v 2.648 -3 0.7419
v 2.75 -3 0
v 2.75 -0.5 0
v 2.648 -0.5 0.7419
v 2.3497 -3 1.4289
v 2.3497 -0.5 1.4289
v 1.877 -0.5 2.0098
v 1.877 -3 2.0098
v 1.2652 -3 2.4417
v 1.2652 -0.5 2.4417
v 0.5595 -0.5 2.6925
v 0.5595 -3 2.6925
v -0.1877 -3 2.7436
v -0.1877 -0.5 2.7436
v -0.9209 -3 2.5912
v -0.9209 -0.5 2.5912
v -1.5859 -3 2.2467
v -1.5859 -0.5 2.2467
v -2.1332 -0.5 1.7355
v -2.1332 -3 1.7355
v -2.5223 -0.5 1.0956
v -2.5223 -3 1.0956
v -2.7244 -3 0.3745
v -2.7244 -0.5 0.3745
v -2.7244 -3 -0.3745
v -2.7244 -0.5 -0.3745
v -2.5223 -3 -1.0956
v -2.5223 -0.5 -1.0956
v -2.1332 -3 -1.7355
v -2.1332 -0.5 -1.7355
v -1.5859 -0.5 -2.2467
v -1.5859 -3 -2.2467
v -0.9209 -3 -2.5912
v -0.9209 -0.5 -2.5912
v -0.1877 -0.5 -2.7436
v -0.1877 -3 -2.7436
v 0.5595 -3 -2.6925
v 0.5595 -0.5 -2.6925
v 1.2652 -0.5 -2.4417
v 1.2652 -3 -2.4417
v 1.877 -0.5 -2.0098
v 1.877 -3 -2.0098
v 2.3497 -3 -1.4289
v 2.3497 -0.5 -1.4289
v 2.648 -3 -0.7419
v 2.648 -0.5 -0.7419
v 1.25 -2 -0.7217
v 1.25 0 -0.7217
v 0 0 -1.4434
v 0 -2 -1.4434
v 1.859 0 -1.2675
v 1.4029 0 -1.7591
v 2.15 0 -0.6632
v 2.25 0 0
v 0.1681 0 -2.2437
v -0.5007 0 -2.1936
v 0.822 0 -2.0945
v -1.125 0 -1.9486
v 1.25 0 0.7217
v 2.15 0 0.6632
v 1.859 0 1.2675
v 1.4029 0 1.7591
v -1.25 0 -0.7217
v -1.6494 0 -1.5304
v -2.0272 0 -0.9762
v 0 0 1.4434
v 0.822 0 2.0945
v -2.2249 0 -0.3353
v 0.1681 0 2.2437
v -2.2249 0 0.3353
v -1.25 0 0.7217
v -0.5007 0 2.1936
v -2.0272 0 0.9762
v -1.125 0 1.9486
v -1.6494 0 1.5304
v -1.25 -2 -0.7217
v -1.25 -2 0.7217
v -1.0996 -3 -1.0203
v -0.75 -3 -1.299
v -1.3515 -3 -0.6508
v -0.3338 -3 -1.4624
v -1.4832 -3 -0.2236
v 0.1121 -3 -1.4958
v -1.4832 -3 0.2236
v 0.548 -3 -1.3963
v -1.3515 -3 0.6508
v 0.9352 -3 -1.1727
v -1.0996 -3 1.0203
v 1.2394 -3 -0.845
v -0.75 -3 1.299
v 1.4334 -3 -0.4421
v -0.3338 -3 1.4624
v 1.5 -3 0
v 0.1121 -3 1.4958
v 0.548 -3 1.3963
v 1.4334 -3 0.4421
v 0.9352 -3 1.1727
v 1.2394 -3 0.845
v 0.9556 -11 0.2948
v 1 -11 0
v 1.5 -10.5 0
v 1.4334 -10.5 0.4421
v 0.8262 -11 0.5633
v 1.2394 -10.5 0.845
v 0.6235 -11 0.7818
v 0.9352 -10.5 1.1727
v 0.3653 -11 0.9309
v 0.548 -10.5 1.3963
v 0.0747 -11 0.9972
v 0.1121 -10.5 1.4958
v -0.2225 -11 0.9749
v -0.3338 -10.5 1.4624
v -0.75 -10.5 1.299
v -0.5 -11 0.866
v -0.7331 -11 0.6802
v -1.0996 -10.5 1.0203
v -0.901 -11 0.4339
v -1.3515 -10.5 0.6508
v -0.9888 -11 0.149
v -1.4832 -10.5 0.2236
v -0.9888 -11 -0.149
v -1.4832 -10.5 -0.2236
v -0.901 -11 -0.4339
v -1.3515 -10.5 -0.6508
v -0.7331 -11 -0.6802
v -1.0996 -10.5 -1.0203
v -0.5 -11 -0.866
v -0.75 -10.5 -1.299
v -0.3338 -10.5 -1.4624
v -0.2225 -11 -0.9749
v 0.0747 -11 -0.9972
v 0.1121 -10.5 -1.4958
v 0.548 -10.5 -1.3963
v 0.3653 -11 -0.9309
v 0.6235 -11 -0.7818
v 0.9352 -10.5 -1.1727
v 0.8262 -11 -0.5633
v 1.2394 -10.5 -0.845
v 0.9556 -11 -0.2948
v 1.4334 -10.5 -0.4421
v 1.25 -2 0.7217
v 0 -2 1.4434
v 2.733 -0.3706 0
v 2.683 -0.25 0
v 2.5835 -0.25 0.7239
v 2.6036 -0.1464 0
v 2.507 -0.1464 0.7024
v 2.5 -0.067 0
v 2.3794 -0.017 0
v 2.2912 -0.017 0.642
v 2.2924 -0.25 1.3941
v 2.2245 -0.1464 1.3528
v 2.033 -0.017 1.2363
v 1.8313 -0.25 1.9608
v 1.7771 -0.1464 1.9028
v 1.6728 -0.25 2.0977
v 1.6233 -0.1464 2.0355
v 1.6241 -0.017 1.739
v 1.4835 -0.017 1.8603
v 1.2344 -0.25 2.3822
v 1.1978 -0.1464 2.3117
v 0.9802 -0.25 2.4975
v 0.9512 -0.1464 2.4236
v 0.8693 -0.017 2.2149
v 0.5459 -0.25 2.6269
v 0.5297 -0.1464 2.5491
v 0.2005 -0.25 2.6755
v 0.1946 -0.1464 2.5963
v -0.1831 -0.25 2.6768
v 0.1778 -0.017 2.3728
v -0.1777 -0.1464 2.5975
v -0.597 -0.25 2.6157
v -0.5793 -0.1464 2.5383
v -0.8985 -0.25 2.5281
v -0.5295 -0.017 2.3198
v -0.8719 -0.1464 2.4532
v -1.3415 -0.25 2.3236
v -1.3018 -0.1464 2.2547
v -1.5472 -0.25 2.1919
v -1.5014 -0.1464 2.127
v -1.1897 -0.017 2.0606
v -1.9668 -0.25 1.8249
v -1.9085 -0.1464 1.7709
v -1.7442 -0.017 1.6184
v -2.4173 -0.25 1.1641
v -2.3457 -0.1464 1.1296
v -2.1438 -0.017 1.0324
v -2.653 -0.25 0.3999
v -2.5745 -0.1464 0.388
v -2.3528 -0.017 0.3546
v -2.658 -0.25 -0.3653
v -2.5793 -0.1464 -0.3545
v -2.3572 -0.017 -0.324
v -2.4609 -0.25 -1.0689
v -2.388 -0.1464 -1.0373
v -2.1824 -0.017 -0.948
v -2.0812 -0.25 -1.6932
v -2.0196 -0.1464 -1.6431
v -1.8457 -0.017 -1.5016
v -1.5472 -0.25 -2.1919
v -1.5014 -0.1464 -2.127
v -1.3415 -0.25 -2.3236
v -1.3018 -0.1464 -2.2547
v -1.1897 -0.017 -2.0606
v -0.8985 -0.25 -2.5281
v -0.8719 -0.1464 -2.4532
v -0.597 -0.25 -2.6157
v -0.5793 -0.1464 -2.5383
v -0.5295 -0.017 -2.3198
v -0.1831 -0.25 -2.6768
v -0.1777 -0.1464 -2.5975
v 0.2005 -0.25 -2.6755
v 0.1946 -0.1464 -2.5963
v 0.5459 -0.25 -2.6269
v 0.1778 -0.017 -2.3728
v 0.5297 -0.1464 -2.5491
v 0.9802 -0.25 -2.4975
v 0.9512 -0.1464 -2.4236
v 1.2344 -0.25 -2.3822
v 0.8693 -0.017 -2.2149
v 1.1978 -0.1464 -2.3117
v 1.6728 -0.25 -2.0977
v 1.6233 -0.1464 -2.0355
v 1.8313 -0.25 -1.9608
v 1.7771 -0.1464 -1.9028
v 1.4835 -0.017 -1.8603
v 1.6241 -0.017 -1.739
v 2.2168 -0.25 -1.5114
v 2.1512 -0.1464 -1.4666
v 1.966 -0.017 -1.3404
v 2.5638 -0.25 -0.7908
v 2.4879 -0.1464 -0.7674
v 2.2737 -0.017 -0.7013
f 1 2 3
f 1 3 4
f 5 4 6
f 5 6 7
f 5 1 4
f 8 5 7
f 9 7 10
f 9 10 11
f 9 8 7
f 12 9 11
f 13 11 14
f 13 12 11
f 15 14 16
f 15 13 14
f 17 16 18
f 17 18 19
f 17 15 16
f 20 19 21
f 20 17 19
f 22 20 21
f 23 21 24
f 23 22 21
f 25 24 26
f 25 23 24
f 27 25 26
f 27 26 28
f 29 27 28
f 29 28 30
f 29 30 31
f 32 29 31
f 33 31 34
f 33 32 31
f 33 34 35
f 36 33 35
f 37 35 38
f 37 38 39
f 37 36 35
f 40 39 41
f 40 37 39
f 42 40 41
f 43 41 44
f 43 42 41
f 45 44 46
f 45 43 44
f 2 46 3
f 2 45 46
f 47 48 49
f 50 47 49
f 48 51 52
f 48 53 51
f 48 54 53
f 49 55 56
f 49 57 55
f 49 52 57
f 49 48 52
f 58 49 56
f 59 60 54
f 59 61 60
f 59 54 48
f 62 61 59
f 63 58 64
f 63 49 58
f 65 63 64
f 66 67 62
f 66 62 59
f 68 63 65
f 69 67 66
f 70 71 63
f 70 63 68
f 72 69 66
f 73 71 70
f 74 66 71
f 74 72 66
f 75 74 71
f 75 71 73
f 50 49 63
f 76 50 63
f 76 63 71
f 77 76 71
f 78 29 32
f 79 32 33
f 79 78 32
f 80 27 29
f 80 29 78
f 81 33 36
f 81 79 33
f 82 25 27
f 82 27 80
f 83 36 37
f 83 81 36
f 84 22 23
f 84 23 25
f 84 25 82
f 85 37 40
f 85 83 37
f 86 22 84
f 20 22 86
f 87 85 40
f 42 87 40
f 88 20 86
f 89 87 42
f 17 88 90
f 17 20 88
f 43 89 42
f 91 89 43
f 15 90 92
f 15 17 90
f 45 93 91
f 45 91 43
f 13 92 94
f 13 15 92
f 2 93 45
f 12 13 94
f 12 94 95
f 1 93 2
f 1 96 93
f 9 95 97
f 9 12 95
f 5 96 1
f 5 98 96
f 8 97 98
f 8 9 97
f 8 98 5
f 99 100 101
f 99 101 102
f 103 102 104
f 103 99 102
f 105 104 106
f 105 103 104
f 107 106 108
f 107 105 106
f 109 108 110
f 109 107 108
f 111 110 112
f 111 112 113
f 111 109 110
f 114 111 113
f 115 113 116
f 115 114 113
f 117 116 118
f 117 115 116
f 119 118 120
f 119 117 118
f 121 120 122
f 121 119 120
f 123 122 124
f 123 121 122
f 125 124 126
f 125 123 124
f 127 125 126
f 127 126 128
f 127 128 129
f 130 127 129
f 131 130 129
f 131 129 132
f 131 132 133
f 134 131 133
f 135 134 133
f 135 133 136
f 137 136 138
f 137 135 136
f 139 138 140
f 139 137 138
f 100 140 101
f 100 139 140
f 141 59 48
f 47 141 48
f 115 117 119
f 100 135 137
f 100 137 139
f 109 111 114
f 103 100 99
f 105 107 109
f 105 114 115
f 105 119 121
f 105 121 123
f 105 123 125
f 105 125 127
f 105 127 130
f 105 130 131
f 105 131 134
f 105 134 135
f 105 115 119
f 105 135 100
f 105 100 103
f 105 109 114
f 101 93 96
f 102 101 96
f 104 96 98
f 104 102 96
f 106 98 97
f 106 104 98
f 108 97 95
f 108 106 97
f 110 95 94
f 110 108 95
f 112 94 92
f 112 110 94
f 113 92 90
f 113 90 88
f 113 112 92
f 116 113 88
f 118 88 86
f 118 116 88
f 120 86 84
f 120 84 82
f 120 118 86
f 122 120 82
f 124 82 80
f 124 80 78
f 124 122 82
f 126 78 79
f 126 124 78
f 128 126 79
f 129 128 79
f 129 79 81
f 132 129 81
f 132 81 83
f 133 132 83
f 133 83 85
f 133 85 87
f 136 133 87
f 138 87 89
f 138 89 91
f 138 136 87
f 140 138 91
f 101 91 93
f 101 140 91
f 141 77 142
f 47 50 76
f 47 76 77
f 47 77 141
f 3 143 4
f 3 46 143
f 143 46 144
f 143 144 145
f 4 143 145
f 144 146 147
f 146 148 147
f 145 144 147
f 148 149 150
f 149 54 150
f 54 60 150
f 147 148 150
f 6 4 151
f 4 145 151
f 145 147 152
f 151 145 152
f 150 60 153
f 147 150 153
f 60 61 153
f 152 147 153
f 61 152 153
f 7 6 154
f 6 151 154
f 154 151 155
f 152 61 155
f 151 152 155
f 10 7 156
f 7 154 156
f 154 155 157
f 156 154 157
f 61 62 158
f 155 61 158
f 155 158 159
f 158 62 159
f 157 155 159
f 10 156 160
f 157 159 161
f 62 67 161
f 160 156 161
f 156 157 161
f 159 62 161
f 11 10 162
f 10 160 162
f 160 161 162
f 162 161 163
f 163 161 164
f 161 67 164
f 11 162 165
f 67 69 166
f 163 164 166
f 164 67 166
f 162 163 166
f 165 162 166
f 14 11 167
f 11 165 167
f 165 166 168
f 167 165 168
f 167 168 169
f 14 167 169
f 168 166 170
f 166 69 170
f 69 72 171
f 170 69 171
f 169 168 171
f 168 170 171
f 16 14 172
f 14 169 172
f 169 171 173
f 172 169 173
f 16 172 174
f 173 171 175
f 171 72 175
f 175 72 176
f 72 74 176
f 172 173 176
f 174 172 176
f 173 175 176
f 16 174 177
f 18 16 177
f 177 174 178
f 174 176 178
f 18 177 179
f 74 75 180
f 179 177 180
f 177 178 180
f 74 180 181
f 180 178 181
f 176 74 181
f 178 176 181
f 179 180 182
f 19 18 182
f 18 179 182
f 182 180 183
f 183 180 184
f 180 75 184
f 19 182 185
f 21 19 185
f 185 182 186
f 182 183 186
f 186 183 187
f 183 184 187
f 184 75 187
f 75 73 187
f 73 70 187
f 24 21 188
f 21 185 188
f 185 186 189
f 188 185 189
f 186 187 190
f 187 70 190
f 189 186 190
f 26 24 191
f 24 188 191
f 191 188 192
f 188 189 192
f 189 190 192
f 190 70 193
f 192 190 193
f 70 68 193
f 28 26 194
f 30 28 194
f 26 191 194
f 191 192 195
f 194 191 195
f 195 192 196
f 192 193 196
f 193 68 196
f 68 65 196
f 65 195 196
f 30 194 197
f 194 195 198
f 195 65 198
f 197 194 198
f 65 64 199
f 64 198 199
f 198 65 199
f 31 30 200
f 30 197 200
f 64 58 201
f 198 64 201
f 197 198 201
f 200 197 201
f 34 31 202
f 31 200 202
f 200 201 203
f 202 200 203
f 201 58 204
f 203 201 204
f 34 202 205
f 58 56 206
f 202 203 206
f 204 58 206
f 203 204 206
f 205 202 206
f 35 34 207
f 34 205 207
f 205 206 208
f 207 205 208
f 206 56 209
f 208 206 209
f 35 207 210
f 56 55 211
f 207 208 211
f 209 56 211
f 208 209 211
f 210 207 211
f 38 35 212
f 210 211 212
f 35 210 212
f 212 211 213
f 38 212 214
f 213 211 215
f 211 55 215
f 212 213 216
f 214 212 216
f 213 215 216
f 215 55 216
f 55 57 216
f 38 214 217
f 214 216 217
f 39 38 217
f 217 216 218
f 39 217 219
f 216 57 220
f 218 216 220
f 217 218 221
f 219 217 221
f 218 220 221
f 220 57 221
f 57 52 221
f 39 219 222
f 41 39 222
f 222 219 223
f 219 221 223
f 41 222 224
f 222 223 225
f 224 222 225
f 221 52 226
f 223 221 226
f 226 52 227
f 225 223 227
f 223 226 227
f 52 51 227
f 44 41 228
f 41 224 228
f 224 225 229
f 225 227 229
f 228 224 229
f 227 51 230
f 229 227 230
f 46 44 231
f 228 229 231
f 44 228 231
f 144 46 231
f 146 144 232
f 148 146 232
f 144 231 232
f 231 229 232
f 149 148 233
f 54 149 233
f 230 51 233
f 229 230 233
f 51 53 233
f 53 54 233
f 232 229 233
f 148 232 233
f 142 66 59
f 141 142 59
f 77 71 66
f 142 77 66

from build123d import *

# Parameters (mm, degrees)
CORTAR_EXTRUIR1_DEPTH = 2
CHAFL_N1_SIZE         = 0.5
REDONDEO1_R           = 0.5


with BuildPart() as part:
    # Croquis1 → Revolución1 (revolve)
    with BuildSketch(Plane.XY):
        Polygon((0, 0), (2.75, 0), (2.75, -3), (1.5, -3), (1.5, -11), (0, -11), align=None)
    revolve(axis=Axis((0, 0, 0), (0, -1, 0)))

    # Croquis2 → Cortar-Extruir1 (cut)
    with BuildSketch(Plane(origin=(0, 0, 0), x_dir=(1, 0, 0), z_dir=(0, 1, 0))):
        Polygon((1.25, 0.721687836), (0, 1.443375673), (-1.25, 0.721687836), (-1.25, -0.721687836), (0, -1.443375673), (1.25, -0.721687836), align=None)
    extrude(amount=-CORTAR_EXTRUIR1_DEPTH, mode=Mode.SUBTRACT)

    # Chaflán1
    chafl_n1_edges = [part.edges().sort_by_distance(p)[0] for p in [
        (-1.5, -11, 0),
    ]]
    chamfer(chafl_n1_edges, length=CHAFL_N1_SIZE)

    # Redondeo1
    redondeo1_edges = [part.edges().sort_by_distance(p)[0] for p in [
        (-2.75, 0, 0),
    ]]
    fillet(redondeo1_edges, radius=REDONDEO1_R)


solid = part.part
